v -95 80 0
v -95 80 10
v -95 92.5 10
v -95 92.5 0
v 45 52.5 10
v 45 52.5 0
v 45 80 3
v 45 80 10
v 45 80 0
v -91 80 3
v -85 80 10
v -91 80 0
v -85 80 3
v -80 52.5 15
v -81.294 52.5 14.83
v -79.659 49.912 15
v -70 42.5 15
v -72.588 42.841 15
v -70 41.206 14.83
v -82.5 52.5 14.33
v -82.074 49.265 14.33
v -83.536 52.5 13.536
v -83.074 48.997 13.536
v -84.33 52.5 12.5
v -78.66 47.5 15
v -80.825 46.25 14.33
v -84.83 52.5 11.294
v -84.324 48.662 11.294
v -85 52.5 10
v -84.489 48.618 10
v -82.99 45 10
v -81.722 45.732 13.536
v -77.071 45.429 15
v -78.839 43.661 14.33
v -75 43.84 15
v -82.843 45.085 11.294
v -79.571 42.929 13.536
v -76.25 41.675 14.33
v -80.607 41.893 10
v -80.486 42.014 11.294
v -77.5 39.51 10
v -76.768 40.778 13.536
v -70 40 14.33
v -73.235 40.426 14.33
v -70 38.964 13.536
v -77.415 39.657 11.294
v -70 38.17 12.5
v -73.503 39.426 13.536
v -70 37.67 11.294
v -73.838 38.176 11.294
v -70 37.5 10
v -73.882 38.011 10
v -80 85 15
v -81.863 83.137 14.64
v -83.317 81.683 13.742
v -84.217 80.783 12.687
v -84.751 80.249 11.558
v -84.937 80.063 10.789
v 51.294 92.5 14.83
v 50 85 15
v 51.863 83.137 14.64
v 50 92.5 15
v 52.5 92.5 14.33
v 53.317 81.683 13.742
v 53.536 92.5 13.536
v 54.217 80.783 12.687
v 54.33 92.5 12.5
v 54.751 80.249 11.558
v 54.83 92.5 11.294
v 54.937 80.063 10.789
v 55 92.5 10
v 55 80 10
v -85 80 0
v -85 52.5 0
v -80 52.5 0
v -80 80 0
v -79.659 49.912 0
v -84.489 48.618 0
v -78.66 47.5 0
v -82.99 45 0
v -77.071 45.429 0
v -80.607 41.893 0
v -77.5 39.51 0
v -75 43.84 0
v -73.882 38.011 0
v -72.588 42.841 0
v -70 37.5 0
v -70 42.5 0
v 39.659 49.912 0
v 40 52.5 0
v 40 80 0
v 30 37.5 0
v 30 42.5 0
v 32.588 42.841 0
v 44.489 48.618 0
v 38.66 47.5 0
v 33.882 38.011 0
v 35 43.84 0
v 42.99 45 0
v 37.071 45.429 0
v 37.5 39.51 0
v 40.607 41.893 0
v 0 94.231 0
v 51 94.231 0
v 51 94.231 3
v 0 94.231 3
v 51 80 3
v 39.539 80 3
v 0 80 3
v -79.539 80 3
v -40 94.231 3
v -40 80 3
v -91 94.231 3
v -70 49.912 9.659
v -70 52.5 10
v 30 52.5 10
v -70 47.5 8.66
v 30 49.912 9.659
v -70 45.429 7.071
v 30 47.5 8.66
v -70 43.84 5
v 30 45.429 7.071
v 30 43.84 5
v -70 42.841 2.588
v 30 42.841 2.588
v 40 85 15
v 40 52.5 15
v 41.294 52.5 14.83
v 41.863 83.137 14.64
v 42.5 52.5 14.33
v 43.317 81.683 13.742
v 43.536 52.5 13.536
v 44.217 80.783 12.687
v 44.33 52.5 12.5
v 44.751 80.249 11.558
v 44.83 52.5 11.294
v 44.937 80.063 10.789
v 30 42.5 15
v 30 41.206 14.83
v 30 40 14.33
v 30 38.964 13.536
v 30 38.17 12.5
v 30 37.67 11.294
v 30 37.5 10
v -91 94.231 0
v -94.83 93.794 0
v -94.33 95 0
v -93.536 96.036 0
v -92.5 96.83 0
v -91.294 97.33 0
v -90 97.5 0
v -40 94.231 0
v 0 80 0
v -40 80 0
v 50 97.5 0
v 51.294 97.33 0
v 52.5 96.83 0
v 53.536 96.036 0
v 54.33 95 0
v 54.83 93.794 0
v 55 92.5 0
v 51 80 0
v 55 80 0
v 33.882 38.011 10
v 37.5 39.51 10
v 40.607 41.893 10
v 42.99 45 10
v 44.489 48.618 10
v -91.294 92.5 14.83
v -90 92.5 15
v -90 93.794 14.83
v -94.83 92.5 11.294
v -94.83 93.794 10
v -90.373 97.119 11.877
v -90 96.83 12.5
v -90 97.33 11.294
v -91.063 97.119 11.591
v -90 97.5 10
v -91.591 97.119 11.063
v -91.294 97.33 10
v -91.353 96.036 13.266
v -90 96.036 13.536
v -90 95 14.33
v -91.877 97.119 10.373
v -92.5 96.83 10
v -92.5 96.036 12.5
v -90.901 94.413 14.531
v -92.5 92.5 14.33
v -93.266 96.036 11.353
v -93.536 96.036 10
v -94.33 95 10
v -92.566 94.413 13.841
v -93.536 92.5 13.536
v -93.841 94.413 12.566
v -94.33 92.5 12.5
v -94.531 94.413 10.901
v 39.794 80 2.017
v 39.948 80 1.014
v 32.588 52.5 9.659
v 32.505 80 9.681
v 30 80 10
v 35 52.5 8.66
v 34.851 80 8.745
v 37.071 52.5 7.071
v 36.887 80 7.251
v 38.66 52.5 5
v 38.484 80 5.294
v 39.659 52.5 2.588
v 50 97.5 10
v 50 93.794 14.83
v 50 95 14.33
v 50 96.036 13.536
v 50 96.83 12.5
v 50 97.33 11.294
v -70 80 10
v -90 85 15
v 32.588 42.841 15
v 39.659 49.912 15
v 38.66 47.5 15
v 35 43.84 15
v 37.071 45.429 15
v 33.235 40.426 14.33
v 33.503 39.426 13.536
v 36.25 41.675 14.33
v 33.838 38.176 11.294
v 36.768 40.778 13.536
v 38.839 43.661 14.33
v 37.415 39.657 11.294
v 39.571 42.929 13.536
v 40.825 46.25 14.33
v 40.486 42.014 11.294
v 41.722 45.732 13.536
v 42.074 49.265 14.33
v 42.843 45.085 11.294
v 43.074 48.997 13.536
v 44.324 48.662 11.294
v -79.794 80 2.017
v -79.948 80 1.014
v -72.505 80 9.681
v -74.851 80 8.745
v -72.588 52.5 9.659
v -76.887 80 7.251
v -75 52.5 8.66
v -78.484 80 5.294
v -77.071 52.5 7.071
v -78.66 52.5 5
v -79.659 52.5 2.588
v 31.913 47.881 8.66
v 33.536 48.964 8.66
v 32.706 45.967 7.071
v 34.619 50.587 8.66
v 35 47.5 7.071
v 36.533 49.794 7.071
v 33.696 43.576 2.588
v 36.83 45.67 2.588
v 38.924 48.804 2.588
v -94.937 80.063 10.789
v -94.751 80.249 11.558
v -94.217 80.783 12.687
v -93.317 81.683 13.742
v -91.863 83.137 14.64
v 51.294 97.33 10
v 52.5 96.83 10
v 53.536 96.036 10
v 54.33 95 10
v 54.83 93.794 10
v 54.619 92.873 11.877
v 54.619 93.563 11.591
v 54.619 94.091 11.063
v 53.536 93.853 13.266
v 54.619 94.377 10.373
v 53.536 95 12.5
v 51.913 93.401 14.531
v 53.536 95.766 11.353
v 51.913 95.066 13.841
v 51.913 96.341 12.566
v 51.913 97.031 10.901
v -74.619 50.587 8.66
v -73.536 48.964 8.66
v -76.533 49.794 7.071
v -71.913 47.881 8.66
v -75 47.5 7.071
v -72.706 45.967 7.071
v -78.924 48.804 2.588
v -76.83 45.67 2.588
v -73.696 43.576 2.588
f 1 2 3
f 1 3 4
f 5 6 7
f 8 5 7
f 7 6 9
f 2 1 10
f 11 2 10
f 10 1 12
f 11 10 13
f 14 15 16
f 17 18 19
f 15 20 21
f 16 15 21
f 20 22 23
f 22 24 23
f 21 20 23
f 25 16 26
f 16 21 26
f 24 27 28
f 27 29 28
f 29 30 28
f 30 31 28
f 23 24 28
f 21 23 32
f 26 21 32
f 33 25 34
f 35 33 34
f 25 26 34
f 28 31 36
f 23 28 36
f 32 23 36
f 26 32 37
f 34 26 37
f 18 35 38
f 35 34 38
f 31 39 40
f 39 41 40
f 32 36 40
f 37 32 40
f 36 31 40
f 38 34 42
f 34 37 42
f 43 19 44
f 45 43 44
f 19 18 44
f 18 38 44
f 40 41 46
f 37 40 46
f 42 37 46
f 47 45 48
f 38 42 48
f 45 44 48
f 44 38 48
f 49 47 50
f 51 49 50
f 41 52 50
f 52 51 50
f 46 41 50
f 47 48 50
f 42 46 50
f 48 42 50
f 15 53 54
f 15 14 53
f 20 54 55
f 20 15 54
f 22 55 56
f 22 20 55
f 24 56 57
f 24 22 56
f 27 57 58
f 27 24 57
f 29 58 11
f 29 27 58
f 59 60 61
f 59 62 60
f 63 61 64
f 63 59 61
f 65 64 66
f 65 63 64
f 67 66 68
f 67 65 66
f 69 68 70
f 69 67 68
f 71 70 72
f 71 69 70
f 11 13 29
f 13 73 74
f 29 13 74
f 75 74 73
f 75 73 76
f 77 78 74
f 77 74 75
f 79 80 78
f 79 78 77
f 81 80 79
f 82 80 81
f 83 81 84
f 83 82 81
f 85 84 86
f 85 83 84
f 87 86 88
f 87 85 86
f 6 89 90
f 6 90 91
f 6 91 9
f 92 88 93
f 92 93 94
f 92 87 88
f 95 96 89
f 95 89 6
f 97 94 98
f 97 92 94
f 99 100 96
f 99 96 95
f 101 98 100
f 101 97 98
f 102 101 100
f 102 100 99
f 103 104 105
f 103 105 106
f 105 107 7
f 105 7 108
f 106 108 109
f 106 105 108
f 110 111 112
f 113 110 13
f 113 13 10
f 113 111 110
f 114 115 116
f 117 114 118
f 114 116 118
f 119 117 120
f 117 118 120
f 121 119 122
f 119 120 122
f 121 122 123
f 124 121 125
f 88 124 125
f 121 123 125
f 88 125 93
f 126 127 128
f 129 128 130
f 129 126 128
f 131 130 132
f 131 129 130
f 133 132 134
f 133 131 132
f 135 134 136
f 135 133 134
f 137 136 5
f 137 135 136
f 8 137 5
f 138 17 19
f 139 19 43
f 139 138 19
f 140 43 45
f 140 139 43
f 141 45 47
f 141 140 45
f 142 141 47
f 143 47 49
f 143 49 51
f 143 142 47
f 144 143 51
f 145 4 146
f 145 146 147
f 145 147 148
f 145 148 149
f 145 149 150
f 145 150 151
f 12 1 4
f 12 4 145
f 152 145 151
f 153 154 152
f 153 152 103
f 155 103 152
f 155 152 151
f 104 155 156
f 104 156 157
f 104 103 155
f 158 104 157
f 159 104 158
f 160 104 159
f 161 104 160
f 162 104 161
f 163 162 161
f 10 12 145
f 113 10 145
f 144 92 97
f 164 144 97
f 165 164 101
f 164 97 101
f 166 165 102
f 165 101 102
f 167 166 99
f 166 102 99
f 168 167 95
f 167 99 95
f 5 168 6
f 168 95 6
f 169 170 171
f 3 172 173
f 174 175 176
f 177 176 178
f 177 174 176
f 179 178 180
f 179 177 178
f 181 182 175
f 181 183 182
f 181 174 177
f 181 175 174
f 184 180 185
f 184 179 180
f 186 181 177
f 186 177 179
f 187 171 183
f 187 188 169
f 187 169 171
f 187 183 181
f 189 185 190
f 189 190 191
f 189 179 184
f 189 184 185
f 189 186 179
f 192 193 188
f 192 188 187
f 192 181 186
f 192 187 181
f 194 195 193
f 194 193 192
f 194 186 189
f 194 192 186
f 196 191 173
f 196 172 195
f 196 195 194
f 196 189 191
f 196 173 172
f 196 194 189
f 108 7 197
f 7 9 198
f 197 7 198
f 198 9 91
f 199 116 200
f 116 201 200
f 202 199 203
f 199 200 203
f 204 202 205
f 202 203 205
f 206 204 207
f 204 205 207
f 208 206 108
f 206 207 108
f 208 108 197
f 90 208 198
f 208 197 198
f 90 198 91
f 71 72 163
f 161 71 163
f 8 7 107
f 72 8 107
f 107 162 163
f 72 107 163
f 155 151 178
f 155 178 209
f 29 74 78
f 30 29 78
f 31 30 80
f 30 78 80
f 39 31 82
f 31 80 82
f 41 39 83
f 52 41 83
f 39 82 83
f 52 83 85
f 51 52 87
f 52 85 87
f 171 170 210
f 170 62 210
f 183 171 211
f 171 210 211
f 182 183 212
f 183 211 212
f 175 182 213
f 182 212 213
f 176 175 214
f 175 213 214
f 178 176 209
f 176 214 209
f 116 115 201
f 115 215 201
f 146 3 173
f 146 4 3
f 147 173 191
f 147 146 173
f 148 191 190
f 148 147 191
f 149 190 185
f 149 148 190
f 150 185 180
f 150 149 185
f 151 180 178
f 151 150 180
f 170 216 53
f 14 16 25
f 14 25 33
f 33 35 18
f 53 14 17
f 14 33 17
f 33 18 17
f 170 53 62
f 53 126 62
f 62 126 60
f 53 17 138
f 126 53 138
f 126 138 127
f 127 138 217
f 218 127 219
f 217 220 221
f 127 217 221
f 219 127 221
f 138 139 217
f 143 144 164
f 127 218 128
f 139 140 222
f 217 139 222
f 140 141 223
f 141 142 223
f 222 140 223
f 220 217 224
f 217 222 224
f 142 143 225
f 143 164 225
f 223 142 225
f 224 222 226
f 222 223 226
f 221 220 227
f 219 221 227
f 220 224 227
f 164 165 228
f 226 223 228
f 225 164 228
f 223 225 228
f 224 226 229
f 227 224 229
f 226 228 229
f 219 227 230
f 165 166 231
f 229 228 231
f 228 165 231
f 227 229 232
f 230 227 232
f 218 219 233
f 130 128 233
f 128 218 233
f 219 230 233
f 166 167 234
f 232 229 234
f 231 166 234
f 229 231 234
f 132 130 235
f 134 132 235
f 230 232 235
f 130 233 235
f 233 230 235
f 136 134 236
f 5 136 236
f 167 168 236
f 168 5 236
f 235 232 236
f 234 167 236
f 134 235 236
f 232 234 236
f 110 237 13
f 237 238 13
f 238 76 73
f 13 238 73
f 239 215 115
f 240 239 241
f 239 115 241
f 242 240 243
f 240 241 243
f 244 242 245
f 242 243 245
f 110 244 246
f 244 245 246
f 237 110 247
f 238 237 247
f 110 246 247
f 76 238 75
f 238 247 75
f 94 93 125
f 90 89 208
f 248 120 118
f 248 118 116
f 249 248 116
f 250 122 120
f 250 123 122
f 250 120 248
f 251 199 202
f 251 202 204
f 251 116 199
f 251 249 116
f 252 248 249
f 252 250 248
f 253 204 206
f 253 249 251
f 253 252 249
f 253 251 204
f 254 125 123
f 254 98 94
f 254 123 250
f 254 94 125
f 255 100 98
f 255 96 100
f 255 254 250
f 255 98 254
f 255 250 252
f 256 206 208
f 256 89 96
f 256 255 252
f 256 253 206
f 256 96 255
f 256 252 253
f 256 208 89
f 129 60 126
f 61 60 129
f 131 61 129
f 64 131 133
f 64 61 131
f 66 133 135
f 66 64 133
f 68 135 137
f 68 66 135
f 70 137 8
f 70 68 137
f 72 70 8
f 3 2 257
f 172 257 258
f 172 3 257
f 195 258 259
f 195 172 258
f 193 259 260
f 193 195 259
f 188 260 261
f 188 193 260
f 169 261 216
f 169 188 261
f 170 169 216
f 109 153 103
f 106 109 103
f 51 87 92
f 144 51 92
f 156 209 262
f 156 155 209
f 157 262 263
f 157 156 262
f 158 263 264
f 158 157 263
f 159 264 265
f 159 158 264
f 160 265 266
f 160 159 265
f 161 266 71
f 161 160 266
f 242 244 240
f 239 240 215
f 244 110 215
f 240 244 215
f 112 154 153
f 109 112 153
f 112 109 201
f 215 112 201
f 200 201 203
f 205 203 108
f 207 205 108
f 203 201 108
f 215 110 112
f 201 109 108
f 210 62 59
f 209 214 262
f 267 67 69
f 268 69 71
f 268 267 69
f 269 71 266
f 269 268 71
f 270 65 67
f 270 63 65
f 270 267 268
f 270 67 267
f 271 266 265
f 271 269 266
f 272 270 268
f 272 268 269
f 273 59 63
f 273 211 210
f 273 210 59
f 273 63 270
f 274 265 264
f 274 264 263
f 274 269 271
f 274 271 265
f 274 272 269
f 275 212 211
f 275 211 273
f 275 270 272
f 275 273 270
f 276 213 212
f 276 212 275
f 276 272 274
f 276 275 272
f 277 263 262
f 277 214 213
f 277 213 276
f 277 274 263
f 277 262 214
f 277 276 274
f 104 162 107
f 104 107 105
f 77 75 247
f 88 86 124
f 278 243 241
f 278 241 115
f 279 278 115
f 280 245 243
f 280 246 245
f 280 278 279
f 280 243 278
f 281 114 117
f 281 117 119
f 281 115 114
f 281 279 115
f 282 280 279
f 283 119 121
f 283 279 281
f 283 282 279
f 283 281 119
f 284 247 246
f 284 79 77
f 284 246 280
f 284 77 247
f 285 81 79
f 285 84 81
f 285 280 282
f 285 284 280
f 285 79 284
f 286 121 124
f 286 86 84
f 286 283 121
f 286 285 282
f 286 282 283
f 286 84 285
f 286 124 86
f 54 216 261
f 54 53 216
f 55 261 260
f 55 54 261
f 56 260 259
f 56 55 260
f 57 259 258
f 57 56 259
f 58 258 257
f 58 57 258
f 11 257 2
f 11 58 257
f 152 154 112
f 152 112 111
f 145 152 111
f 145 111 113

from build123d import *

# Parameters (mm, degrees)
BOSS_EXTRUDE2_DEPTH = 10
BOSS_EXTRUDE3_DEPTH = 5
FILLET1_R           = 10
SKETCH3_W           = 150
SKETCH3_H           = 15
BOSS_EXTRUDE4_DEPTH = 17.5
SKETCH5_W           = 51
SKETCH5_H           = 14.230744396
CUT_EXTRUDE1_DEPTH  = 3
FILLET2_R           = 5


with BuildPart() as part:
    # Sketch1 → Boss-Extrude2 (new body)
    with BuildSketch(Plane.XY):
        with BuildLine():
            Line((40, 52.5), (40, 80))
            Line((40, 80), (45, 80))
            Line((45, 80), (45, 52.5))
            ThreePointArc((45, 52.5), (40.606601718, 41.893398282), (30, 37.5))
            Line((30, 37.5), (-70, 37.5))
            ThreePointArc((-70, 37.5), (-80.606601718, 41.893398282), (-85, 52.5))
            Line((-85, 52.5), (-85, 80))
            Line((-85, 80), (-80, 80))
            Line((-80, 80), (-80, 52.5))
            ThreePointArc((-80, 52.5), (-77.071067812, 45.428932188), (-70, 42.5))
            Line((-70, 42.5), (30, 42.5))
            ThreePointArc((30, 42.5), (37.071067812, 45.428932188), (40, 52.5))
        make_face()
    extrude(amount=BOSS_EXTRUDE2_DEPTH)

    # Sketch2 → Boss-Extrude3 (add)
    with BuildSketch(Plane.XY.offset(10)):
        with BuildLine():
            Line((45, 52.5), (45, 80))
            Line((45, 80), (-85, 80))
            Line((-85, 80), (-85, 52.5))
            ThreePointArc((-85, 52.5), (-80.606601718, 41.893398282), (-70, 37.5))
            Line((-70, 37.5), (30, 37.5))
            ThreePointArc((30, 37.5), (40.606601718, 41.893398282), (45, 52.5))
        make_face()
    extrude(amount=BOSS_EXTRUDE3_DEPTH)

    # Fillet1
    fillet1_edges = [part.edges().sort_by_distance(p)[0] for p in [
        (-80, 66.25, 10),
        (-77.071067812, 45.428932188, 10),
        (-20, 42.5, 10),
        (37.071067812, 45.428932188, 10),
        (40, 66.25, 10),
    ]]
    fillet(fillet1_edges, radius=FILLET1_R - 0.0001)  # a hair under: the kernel refuses the full size

    # Sketch3 → Boss-Extrude4 (add)
    with BuildSketch(Plane(origin=(0, 80, 0), x_dir=(1, 0, 0), z_dir=(0, 1, 0))):
        with Locations((-20, -7.5)):
            Rectangle(SKETCH3_W, SKETCH3_H)
    extrude(amount=BOSS_EXTRUDE4_DEPTH)

    # Sketch5 → Cut-Extrude1 (cut)
    with BuildSketch(Plane(origin=(0, 0, 0), x_dir=(-1, 0, 0), z_dir=(0, 0, -1))):
        with Locations((-25.5, 87.115372198)):
            Rectangle(SKETCH5_W, SKETCH5_H)
        with Locations((65.5, 87.115372198)):
            Rectangle(SKETCH5_W, SKETCH5_H)
    extrude(amount=-CUT_EXTRUDE1_DEPTH, mode=Mode.SUBTRACT)

    # Fillet2
    fillet2_edges = [part.edges().sort_by_distance(p)[0] for p in [
        (-20, 37.5, 15),
        (-80.606601718, 41.893398282, 15),
        (-85, 66.25, 15),
        (-90, 80, 15),
        (-95, 88.75, 15),
        (-20, 97.5, 15),
        (55, 88.75, 15),
        (50, 80, 15),
        (45, 66.25, 15),
        (40.606601718, 41.893398282, 15),
        (-95, 97.5, 7.5),
        (55, 97.5, 7.5),
    ]]
    fillet(fillet2_edges, radius=FILLET2_R)


solid = part.part
